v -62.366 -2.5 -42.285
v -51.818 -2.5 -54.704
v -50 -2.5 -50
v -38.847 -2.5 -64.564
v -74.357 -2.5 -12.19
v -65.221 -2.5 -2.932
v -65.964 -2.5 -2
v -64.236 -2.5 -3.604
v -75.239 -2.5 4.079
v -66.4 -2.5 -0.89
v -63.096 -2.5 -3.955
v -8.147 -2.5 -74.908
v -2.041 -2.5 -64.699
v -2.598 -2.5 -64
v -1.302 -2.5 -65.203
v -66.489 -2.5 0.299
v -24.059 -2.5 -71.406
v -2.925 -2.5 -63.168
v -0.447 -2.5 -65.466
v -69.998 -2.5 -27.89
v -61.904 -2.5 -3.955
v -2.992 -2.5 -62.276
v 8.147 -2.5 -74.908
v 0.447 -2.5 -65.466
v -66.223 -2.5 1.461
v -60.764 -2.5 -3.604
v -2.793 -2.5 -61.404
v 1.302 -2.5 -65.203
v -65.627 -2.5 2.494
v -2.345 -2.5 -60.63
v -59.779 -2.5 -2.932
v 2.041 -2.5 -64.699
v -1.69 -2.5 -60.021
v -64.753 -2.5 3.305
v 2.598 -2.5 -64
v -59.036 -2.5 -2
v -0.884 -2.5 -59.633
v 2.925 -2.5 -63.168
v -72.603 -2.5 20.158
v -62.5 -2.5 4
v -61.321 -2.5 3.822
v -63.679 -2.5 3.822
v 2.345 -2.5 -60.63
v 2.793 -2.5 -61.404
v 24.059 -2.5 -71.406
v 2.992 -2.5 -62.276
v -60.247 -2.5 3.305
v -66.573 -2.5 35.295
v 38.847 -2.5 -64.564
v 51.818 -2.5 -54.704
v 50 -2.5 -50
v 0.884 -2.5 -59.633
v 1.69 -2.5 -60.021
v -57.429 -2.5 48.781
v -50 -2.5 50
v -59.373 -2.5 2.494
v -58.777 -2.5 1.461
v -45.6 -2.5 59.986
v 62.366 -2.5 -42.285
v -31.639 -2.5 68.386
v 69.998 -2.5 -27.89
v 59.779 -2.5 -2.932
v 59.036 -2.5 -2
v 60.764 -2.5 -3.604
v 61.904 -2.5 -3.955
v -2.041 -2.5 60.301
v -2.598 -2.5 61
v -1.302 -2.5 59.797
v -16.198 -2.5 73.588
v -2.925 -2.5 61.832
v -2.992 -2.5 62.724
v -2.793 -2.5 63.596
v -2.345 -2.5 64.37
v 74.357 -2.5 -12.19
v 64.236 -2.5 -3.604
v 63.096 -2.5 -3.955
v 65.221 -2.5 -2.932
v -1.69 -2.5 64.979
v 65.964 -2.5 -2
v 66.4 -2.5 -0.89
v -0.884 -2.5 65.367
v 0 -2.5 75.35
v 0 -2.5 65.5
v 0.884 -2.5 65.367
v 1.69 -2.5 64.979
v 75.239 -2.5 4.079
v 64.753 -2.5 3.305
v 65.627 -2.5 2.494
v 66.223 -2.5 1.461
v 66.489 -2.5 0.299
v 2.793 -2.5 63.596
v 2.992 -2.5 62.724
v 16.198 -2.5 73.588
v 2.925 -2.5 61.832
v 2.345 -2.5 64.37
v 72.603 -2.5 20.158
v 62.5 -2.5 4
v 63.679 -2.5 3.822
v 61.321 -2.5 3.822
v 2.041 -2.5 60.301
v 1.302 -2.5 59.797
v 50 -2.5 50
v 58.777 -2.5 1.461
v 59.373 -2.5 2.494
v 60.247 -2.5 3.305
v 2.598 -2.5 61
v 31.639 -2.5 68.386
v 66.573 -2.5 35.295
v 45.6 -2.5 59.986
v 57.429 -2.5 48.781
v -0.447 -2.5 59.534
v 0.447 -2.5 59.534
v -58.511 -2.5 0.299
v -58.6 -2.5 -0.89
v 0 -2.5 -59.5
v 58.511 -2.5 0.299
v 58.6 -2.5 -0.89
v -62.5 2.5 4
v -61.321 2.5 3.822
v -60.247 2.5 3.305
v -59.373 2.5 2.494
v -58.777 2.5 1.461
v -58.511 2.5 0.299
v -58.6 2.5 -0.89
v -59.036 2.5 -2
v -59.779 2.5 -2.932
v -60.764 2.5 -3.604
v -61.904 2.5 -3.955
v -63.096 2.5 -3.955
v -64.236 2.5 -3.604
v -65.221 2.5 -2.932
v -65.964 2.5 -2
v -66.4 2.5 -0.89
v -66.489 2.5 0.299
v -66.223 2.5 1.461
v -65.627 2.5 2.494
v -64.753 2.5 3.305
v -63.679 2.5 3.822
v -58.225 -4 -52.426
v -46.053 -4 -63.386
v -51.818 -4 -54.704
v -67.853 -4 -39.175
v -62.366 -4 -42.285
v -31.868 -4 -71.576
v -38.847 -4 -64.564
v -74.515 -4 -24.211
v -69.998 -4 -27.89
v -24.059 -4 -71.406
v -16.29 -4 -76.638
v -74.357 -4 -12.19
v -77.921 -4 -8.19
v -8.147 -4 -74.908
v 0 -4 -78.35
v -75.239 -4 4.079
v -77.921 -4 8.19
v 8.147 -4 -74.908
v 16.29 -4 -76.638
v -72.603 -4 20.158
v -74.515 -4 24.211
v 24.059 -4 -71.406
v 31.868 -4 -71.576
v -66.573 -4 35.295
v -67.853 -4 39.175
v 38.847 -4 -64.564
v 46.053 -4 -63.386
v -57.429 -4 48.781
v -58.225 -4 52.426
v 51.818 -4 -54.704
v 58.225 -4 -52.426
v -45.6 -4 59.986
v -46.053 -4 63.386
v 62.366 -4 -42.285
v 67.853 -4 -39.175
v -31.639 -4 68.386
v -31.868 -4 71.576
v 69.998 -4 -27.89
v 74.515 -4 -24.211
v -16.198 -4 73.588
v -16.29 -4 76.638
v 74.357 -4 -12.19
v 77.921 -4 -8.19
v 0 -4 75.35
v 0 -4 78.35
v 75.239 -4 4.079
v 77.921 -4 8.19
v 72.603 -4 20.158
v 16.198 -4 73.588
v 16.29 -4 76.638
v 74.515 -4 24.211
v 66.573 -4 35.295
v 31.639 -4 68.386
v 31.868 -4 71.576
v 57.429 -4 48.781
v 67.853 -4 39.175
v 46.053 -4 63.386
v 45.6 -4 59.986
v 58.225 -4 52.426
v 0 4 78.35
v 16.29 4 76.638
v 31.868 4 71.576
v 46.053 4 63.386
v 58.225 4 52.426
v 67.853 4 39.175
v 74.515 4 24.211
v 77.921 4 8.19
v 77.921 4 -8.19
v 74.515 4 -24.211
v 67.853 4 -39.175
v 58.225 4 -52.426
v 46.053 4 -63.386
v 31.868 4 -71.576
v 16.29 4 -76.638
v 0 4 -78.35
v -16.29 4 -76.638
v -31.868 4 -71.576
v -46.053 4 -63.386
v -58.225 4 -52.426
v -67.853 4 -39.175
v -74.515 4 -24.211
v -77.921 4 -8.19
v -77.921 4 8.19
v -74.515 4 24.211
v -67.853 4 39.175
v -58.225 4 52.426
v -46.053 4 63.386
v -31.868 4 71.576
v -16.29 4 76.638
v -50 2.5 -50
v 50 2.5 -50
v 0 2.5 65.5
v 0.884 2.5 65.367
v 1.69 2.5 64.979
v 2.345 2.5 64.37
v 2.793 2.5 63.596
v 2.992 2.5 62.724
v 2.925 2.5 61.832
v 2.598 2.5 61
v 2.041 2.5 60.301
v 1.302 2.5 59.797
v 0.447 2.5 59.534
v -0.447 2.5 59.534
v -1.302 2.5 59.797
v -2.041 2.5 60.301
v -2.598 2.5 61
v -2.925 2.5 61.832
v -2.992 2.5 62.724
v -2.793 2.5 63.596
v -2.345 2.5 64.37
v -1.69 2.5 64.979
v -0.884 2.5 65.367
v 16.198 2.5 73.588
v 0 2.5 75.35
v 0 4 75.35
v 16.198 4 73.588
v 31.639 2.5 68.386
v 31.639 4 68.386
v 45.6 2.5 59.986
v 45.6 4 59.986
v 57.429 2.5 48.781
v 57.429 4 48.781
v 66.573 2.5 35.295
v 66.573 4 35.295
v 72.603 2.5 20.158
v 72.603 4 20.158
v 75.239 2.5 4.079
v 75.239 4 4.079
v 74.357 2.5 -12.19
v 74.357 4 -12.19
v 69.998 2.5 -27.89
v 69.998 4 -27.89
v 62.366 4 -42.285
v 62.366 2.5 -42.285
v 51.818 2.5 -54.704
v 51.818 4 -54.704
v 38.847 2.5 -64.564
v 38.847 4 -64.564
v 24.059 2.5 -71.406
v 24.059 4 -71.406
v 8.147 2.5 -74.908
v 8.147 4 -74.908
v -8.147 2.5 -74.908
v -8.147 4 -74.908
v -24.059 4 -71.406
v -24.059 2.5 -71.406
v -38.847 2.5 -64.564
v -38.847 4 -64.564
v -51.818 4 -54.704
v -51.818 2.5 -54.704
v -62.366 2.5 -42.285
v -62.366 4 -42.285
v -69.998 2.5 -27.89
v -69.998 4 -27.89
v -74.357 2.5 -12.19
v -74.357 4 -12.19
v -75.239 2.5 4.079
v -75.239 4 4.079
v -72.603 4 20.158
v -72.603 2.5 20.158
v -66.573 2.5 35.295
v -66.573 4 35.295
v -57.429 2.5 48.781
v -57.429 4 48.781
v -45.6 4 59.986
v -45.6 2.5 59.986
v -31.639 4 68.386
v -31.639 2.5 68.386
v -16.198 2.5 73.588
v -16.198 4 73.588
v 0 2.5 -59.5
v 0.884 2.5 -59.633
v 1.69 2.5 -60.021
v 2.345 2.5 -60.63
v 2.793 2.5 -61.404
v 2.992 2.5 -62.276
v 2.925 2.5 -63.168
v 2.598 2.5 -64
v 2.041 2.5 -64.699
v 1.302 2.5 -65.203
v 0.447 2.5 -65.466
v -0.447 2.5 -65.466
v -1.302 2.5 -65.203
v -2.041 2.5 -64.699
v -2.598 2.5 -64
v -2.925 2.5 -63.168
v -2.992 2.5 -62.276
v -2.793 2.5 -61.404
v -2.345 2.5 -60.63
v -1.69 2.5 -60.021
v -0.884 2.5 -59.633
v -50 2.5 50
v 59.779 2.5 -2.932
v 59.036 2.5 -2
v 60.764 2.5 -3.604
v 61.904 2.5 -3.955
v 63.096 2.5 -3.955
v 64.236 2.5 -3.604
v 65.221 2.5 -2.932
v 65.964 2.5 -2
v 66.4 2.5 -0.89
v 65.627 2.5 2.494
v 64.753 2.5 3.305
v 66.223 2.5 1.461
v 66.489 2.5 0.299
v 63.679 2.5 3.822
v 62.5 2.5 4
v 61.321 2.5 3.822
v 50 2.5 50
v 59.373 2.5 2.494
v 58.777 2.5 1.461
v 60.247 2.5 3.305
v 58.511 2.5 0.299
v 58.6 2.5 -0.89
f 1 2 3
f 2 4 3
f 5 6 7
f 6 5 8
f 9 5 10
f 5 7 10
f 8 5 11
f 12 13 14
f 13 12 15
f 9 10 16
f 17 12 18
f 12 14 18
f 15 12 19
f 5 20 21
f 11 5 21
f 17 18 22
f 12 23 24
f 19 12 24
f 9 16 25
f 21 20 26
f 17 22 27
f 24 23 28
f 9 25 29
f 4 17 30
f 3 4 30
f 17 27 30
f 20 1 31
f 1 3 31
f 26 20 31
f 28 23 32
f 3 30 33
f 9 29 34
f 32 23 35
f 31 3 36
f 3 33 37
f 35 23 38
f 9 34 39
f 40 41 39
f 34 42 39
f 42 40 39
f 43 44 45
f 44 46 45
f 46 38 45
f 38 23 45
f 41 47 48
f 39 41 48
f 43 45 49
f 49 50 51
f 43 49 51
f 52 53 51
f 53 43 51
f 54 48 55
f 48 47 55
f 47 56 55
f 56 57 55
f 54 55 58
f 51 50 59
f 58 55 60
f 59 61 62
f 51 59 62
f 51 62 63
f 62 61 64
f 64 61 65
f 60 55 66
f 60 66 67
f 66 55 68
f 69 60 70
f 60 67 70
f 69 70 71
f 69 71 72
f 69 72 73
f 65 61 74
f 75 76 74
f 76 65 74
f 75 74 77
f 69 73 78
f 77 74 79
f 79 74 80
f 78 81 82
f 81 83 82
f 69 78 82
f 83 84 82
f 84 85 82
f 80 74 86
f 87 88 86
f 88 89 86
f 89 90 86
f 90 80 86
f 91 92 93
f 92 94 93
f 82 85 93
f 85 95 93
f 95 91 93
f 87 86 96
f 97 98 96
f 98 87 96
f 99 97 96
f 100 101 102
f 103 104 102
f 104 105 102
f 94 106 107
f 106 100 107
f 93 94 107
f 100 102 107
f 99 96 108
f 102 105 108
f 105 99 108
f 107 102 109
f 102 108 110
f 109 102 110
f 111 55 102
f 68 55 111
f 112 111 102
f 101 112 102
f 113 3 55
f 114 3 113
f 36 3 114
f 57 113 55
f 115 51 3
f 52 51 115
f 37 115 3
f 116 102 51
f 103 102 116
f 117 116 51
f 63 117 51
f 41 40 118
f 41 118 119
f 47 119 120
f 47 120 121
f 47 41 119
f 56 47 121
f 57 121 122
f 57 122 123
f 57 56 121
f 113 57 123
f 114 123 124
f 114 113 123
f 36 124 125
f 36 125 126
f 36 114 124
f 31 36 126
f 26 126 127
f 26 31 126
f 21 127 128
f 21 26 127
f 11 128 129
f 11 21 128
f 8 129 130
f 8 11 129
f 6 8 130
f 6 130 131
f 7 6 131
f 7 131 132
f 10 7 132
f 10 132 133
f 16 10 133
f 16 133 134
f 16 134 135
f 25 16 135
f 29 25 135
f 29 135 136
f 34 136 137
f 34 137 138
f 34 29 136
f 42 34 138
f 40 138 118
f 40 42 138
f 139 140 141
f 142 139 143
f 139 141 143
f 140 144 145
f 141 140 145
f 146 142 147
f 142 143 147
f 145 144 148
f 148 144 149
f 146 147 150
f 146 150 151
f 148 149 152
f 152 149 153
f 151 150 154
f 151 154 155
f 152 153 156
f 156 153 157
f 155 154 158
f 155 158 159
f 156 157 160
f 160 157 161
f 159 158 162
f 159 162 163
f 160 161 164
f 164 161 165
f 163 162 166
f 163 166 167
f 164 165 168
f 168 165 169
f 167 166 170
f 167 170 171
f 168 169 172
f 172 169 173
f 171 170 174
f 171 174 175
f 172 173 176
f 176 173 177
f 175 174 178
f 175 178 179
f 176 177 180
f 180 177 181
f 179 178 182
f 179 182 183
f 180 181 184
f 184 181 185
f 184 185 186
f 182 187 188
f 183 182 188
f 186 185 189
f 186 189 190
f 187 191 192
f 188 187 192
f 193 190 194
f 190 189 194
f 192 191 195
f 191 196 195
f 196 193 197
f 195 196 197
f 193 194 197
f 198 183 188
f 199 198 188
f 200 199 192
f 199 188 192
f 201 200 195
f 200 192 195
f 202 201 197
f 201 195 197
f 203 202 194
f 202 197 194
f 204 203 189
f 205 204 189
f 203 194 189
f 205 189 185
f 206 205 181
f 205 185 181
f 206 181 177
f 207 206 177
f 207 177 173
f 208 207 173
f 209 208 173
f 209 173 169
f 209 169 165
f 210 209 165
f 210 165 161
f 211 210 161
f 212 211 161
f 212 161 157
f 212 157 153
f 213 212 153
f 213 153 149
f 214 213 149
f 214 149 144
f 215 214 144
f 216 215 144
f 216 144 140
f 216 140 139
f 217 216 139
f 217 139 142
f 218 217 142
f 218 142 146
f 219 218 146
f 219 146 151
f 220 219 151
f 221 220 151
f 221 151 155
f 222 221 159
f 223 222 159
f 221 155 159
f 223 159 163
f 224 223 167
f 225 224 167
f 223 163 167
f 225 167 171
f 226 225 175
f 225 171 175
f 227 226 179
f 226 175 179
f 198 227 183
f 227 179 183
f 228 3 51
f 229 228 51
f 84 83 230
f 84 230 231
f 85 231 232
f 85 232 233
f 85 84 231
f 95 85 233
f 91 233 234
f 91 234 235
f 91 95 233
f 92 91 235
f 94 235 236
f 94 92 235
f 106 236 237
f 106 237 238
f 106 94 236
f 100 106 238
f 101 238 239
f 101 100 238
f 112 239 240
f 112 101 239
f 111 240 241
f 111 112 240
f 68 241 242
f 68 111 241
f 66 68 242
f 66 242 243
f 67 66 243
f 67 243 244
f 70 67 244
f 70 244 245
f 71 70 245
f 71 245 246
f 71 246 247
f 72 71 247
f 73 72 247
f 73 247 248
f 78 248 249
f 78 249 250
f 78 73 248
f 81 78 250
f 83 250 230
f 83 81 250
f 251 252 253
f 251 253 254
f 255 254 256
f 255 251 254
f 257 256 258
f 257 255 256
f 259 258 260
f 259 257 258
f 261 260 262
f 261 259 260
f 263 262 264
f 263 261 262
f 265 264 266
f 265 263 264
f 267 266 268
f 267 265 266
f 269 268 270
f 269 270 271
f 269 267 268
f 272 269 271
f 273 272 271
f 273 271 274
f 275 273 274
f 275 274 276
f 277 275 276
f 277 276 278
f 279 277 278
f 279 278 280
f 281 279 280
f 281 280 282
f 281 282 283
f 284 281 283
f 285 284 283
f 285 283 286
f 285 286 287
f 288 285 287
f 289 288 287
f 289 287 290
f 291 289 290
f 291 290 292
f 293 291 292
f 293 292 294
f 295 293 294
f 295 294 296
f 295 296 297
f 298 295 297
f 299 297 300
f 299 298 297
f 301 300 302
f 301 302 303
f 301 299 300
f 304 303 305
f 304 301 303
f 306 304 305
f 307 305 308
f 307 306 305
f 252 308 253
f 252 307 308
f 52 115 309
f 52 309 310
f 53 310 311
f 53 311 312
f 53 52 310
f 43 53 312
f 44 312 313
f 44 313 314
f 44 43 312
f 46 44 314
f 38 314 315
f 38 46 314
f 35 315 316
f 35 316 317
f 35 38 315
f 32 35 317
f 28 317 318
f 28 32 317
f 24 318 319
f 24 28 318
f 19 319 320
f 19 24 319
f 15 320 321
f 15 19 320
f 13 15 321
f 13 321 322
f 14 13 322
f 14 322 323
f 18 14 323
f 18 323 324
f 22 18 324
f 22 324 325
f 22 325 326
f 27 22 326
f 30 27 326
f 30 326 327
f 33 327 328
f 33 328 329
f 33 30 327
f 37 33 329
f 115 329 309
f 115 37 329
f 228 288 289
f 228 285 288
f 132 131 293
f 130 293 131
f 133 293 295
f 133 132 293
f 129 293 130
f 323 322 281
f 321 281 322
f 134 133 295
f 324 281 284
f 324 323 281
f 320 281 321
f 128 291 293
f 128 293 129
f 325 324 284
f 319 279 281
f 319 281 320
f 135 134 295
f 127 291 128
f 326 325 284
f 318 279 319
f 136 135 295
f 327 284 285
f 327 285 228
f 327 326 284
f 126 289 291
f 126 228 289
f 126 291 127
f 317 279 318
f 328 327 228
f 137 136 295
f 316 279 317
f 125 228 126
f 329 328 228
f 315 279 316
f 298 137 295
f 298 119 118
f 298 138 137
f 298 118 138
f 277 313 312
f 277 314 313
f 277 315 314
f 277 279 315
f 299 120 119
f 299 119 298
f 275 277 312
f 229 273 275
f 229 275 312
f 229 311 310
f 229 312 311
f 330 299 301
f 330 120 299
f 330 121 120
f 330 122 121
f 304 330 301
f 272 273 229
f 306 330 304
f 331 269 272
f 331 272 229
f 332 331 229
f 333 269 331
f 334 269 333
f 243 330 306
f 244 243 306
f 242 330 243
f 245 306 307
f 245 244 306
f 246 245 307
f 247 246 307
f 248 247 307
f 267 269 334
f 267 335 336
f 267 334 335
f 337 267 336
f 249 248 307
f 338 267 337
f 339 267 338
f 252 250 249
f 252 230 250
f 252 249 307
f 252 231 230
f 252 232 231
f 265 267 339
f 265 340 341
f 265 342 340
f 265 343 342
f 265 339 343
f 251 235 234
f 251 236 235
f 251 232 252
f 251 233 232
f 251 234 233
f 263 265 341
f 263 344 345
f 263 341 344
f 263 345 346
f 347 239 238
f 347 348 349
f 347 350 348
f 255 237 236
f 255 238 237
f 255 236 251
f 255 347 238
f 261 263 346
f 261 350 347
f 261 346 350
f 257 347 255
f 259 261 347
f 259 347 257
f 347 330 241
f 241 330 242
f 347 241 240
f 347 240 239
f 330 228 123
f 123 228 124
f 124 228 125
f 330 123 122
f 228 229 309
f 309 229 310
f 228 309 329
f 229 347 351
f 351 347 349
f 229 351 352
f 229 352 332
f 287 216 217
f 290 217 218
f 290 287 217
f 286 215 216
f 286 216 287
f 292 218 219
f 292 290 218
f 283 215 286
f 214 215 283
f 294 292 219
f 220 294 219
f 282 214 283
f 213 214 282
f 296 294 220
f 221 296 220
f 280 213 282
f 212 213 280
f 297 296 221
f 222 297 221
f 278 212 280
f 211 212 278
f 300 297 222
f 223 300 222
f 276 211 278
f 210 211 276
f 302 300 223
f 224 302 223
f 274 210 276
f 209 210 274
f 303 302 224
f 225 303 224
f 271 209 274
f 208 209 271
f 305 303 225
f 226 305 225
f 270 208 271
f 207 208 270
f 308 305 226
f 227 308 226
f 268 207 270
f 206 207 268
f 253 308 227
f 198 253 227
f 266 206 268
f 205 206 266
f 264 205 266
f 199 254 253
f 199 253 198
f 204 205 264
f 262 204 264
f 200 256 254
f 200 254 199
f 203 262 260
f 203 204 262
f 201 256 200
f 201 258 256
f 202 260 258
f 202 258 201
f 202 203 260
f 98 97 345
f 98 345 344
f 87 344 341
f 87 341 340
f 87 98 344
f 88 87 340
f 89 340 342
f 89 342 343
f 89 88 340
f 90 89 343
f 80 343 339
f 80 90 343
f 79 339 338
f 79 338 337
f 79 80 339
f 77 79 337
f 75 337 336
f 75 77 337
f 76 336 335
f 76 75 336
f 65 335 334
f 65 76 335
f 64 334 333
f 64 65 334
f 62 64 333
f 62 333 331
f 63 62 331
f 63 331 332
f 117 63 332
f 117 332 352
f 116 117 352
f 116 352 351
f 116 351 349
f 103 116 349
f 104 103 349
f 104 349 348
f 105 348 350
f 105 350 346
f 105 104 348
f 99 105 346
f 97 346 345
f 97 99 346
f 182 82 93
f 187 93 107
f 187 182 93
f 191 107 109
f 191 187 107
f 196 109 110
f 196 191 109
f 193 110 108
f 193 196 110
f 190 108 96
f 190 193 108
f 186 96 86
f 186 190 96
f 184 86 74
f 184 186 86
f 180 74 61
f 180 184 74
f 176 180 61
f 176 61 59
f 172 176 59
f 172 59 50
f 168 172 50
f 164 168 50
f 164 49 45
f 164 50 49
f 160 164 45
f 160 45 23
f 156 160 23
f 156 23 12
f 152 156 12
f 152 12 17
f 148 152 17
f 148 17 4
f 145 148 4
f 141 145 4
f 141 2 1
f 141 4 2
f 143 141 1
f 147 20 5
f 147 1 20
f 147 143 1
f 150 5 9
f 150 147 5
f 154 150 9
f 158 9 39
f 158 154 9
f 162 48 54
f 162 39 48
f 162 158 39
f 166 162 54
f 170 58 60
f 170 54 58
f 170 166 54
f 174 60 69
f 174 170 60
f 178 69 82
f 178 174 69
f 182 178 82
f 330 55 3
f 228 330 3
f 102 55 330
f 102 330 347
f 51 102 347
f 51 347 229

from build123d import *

# Parameters (mm, degrees)
BOSS_EXTRUDE1_DEPTH      = 2.5
BOSS_EXTRUDE1_DEPTH_BACK = 2.5
SKETCH1_R                = 78.35
SKETCH1_R_2              = 4
SKETCH1_R_3              = 3
SKETCH1_W                = 100
SKETCH1_H                = 100
BOSS_EXTRUDE2_DEPTH      = 4
BOSS_EXTRUDE2_DEPTH_BACK = 4
SKETCH2_R                = 78.35
SKETCH2_R_2              = 75.35


with BuildPart() as part:
    # Sketch1 → Boss-Extrude1 (new, two sides: drawn at the far end of the back side and taken through both)
    with BuildSketch(Plane(origin=(0, 0, 0), x_dir=(1, 0, 0), z_dir=(0, 1, 0)).offset(-BOSS_EXTRUDE1_DEPTH_BACK)):
        Circle(SKETCH1_R)
        with Locations((62.5, 0)):
            Circle(SKETCH1_R_2, mode=Mode.SUBTRACT)
        with Locations((-62.5, 0)):
            Circle(SKETCH1_R_2, mode=Mode.SUBTRACT)
        with Locations((0, 62.5)):
            Circle(SKETCH1_R_3, mode=Mode.SUBTRACT)
        with Locations((0, -62.5)):
            Circle(SKETCH1_R_3, mode=Mode.SUBTRACT)
        Rectangle(SKETCH1_W, SKETCH1_H, mode=Mode.SUBTRACT)
    extrude(amount=BOSS_EXTRUDE1_DEPTH + BOSS_EXTRUDE1_DEPTH_BACK)

    # Sketch2 → Boss-Extrude2 (add, two sides: drawn at the far end of the back side and taken through both)
    with BuildSketch(Plane(origin=(0, 0, 0), x_dir=(1, 0, 0), z_dir=(0, 1, 0)).offset(-BOSS_EXTRUDE2_DEPTH_BACK)):
        Circle(SKETCH2_R)
        Circle(SKETCH2_R_2, mode=Mode.SUBTRACT)
    extrude(amount=BOSS_EXTRUDE2_DEPTH + BOSS_EXTRUDE2_DEPTH_BACK)


solid = part.part
